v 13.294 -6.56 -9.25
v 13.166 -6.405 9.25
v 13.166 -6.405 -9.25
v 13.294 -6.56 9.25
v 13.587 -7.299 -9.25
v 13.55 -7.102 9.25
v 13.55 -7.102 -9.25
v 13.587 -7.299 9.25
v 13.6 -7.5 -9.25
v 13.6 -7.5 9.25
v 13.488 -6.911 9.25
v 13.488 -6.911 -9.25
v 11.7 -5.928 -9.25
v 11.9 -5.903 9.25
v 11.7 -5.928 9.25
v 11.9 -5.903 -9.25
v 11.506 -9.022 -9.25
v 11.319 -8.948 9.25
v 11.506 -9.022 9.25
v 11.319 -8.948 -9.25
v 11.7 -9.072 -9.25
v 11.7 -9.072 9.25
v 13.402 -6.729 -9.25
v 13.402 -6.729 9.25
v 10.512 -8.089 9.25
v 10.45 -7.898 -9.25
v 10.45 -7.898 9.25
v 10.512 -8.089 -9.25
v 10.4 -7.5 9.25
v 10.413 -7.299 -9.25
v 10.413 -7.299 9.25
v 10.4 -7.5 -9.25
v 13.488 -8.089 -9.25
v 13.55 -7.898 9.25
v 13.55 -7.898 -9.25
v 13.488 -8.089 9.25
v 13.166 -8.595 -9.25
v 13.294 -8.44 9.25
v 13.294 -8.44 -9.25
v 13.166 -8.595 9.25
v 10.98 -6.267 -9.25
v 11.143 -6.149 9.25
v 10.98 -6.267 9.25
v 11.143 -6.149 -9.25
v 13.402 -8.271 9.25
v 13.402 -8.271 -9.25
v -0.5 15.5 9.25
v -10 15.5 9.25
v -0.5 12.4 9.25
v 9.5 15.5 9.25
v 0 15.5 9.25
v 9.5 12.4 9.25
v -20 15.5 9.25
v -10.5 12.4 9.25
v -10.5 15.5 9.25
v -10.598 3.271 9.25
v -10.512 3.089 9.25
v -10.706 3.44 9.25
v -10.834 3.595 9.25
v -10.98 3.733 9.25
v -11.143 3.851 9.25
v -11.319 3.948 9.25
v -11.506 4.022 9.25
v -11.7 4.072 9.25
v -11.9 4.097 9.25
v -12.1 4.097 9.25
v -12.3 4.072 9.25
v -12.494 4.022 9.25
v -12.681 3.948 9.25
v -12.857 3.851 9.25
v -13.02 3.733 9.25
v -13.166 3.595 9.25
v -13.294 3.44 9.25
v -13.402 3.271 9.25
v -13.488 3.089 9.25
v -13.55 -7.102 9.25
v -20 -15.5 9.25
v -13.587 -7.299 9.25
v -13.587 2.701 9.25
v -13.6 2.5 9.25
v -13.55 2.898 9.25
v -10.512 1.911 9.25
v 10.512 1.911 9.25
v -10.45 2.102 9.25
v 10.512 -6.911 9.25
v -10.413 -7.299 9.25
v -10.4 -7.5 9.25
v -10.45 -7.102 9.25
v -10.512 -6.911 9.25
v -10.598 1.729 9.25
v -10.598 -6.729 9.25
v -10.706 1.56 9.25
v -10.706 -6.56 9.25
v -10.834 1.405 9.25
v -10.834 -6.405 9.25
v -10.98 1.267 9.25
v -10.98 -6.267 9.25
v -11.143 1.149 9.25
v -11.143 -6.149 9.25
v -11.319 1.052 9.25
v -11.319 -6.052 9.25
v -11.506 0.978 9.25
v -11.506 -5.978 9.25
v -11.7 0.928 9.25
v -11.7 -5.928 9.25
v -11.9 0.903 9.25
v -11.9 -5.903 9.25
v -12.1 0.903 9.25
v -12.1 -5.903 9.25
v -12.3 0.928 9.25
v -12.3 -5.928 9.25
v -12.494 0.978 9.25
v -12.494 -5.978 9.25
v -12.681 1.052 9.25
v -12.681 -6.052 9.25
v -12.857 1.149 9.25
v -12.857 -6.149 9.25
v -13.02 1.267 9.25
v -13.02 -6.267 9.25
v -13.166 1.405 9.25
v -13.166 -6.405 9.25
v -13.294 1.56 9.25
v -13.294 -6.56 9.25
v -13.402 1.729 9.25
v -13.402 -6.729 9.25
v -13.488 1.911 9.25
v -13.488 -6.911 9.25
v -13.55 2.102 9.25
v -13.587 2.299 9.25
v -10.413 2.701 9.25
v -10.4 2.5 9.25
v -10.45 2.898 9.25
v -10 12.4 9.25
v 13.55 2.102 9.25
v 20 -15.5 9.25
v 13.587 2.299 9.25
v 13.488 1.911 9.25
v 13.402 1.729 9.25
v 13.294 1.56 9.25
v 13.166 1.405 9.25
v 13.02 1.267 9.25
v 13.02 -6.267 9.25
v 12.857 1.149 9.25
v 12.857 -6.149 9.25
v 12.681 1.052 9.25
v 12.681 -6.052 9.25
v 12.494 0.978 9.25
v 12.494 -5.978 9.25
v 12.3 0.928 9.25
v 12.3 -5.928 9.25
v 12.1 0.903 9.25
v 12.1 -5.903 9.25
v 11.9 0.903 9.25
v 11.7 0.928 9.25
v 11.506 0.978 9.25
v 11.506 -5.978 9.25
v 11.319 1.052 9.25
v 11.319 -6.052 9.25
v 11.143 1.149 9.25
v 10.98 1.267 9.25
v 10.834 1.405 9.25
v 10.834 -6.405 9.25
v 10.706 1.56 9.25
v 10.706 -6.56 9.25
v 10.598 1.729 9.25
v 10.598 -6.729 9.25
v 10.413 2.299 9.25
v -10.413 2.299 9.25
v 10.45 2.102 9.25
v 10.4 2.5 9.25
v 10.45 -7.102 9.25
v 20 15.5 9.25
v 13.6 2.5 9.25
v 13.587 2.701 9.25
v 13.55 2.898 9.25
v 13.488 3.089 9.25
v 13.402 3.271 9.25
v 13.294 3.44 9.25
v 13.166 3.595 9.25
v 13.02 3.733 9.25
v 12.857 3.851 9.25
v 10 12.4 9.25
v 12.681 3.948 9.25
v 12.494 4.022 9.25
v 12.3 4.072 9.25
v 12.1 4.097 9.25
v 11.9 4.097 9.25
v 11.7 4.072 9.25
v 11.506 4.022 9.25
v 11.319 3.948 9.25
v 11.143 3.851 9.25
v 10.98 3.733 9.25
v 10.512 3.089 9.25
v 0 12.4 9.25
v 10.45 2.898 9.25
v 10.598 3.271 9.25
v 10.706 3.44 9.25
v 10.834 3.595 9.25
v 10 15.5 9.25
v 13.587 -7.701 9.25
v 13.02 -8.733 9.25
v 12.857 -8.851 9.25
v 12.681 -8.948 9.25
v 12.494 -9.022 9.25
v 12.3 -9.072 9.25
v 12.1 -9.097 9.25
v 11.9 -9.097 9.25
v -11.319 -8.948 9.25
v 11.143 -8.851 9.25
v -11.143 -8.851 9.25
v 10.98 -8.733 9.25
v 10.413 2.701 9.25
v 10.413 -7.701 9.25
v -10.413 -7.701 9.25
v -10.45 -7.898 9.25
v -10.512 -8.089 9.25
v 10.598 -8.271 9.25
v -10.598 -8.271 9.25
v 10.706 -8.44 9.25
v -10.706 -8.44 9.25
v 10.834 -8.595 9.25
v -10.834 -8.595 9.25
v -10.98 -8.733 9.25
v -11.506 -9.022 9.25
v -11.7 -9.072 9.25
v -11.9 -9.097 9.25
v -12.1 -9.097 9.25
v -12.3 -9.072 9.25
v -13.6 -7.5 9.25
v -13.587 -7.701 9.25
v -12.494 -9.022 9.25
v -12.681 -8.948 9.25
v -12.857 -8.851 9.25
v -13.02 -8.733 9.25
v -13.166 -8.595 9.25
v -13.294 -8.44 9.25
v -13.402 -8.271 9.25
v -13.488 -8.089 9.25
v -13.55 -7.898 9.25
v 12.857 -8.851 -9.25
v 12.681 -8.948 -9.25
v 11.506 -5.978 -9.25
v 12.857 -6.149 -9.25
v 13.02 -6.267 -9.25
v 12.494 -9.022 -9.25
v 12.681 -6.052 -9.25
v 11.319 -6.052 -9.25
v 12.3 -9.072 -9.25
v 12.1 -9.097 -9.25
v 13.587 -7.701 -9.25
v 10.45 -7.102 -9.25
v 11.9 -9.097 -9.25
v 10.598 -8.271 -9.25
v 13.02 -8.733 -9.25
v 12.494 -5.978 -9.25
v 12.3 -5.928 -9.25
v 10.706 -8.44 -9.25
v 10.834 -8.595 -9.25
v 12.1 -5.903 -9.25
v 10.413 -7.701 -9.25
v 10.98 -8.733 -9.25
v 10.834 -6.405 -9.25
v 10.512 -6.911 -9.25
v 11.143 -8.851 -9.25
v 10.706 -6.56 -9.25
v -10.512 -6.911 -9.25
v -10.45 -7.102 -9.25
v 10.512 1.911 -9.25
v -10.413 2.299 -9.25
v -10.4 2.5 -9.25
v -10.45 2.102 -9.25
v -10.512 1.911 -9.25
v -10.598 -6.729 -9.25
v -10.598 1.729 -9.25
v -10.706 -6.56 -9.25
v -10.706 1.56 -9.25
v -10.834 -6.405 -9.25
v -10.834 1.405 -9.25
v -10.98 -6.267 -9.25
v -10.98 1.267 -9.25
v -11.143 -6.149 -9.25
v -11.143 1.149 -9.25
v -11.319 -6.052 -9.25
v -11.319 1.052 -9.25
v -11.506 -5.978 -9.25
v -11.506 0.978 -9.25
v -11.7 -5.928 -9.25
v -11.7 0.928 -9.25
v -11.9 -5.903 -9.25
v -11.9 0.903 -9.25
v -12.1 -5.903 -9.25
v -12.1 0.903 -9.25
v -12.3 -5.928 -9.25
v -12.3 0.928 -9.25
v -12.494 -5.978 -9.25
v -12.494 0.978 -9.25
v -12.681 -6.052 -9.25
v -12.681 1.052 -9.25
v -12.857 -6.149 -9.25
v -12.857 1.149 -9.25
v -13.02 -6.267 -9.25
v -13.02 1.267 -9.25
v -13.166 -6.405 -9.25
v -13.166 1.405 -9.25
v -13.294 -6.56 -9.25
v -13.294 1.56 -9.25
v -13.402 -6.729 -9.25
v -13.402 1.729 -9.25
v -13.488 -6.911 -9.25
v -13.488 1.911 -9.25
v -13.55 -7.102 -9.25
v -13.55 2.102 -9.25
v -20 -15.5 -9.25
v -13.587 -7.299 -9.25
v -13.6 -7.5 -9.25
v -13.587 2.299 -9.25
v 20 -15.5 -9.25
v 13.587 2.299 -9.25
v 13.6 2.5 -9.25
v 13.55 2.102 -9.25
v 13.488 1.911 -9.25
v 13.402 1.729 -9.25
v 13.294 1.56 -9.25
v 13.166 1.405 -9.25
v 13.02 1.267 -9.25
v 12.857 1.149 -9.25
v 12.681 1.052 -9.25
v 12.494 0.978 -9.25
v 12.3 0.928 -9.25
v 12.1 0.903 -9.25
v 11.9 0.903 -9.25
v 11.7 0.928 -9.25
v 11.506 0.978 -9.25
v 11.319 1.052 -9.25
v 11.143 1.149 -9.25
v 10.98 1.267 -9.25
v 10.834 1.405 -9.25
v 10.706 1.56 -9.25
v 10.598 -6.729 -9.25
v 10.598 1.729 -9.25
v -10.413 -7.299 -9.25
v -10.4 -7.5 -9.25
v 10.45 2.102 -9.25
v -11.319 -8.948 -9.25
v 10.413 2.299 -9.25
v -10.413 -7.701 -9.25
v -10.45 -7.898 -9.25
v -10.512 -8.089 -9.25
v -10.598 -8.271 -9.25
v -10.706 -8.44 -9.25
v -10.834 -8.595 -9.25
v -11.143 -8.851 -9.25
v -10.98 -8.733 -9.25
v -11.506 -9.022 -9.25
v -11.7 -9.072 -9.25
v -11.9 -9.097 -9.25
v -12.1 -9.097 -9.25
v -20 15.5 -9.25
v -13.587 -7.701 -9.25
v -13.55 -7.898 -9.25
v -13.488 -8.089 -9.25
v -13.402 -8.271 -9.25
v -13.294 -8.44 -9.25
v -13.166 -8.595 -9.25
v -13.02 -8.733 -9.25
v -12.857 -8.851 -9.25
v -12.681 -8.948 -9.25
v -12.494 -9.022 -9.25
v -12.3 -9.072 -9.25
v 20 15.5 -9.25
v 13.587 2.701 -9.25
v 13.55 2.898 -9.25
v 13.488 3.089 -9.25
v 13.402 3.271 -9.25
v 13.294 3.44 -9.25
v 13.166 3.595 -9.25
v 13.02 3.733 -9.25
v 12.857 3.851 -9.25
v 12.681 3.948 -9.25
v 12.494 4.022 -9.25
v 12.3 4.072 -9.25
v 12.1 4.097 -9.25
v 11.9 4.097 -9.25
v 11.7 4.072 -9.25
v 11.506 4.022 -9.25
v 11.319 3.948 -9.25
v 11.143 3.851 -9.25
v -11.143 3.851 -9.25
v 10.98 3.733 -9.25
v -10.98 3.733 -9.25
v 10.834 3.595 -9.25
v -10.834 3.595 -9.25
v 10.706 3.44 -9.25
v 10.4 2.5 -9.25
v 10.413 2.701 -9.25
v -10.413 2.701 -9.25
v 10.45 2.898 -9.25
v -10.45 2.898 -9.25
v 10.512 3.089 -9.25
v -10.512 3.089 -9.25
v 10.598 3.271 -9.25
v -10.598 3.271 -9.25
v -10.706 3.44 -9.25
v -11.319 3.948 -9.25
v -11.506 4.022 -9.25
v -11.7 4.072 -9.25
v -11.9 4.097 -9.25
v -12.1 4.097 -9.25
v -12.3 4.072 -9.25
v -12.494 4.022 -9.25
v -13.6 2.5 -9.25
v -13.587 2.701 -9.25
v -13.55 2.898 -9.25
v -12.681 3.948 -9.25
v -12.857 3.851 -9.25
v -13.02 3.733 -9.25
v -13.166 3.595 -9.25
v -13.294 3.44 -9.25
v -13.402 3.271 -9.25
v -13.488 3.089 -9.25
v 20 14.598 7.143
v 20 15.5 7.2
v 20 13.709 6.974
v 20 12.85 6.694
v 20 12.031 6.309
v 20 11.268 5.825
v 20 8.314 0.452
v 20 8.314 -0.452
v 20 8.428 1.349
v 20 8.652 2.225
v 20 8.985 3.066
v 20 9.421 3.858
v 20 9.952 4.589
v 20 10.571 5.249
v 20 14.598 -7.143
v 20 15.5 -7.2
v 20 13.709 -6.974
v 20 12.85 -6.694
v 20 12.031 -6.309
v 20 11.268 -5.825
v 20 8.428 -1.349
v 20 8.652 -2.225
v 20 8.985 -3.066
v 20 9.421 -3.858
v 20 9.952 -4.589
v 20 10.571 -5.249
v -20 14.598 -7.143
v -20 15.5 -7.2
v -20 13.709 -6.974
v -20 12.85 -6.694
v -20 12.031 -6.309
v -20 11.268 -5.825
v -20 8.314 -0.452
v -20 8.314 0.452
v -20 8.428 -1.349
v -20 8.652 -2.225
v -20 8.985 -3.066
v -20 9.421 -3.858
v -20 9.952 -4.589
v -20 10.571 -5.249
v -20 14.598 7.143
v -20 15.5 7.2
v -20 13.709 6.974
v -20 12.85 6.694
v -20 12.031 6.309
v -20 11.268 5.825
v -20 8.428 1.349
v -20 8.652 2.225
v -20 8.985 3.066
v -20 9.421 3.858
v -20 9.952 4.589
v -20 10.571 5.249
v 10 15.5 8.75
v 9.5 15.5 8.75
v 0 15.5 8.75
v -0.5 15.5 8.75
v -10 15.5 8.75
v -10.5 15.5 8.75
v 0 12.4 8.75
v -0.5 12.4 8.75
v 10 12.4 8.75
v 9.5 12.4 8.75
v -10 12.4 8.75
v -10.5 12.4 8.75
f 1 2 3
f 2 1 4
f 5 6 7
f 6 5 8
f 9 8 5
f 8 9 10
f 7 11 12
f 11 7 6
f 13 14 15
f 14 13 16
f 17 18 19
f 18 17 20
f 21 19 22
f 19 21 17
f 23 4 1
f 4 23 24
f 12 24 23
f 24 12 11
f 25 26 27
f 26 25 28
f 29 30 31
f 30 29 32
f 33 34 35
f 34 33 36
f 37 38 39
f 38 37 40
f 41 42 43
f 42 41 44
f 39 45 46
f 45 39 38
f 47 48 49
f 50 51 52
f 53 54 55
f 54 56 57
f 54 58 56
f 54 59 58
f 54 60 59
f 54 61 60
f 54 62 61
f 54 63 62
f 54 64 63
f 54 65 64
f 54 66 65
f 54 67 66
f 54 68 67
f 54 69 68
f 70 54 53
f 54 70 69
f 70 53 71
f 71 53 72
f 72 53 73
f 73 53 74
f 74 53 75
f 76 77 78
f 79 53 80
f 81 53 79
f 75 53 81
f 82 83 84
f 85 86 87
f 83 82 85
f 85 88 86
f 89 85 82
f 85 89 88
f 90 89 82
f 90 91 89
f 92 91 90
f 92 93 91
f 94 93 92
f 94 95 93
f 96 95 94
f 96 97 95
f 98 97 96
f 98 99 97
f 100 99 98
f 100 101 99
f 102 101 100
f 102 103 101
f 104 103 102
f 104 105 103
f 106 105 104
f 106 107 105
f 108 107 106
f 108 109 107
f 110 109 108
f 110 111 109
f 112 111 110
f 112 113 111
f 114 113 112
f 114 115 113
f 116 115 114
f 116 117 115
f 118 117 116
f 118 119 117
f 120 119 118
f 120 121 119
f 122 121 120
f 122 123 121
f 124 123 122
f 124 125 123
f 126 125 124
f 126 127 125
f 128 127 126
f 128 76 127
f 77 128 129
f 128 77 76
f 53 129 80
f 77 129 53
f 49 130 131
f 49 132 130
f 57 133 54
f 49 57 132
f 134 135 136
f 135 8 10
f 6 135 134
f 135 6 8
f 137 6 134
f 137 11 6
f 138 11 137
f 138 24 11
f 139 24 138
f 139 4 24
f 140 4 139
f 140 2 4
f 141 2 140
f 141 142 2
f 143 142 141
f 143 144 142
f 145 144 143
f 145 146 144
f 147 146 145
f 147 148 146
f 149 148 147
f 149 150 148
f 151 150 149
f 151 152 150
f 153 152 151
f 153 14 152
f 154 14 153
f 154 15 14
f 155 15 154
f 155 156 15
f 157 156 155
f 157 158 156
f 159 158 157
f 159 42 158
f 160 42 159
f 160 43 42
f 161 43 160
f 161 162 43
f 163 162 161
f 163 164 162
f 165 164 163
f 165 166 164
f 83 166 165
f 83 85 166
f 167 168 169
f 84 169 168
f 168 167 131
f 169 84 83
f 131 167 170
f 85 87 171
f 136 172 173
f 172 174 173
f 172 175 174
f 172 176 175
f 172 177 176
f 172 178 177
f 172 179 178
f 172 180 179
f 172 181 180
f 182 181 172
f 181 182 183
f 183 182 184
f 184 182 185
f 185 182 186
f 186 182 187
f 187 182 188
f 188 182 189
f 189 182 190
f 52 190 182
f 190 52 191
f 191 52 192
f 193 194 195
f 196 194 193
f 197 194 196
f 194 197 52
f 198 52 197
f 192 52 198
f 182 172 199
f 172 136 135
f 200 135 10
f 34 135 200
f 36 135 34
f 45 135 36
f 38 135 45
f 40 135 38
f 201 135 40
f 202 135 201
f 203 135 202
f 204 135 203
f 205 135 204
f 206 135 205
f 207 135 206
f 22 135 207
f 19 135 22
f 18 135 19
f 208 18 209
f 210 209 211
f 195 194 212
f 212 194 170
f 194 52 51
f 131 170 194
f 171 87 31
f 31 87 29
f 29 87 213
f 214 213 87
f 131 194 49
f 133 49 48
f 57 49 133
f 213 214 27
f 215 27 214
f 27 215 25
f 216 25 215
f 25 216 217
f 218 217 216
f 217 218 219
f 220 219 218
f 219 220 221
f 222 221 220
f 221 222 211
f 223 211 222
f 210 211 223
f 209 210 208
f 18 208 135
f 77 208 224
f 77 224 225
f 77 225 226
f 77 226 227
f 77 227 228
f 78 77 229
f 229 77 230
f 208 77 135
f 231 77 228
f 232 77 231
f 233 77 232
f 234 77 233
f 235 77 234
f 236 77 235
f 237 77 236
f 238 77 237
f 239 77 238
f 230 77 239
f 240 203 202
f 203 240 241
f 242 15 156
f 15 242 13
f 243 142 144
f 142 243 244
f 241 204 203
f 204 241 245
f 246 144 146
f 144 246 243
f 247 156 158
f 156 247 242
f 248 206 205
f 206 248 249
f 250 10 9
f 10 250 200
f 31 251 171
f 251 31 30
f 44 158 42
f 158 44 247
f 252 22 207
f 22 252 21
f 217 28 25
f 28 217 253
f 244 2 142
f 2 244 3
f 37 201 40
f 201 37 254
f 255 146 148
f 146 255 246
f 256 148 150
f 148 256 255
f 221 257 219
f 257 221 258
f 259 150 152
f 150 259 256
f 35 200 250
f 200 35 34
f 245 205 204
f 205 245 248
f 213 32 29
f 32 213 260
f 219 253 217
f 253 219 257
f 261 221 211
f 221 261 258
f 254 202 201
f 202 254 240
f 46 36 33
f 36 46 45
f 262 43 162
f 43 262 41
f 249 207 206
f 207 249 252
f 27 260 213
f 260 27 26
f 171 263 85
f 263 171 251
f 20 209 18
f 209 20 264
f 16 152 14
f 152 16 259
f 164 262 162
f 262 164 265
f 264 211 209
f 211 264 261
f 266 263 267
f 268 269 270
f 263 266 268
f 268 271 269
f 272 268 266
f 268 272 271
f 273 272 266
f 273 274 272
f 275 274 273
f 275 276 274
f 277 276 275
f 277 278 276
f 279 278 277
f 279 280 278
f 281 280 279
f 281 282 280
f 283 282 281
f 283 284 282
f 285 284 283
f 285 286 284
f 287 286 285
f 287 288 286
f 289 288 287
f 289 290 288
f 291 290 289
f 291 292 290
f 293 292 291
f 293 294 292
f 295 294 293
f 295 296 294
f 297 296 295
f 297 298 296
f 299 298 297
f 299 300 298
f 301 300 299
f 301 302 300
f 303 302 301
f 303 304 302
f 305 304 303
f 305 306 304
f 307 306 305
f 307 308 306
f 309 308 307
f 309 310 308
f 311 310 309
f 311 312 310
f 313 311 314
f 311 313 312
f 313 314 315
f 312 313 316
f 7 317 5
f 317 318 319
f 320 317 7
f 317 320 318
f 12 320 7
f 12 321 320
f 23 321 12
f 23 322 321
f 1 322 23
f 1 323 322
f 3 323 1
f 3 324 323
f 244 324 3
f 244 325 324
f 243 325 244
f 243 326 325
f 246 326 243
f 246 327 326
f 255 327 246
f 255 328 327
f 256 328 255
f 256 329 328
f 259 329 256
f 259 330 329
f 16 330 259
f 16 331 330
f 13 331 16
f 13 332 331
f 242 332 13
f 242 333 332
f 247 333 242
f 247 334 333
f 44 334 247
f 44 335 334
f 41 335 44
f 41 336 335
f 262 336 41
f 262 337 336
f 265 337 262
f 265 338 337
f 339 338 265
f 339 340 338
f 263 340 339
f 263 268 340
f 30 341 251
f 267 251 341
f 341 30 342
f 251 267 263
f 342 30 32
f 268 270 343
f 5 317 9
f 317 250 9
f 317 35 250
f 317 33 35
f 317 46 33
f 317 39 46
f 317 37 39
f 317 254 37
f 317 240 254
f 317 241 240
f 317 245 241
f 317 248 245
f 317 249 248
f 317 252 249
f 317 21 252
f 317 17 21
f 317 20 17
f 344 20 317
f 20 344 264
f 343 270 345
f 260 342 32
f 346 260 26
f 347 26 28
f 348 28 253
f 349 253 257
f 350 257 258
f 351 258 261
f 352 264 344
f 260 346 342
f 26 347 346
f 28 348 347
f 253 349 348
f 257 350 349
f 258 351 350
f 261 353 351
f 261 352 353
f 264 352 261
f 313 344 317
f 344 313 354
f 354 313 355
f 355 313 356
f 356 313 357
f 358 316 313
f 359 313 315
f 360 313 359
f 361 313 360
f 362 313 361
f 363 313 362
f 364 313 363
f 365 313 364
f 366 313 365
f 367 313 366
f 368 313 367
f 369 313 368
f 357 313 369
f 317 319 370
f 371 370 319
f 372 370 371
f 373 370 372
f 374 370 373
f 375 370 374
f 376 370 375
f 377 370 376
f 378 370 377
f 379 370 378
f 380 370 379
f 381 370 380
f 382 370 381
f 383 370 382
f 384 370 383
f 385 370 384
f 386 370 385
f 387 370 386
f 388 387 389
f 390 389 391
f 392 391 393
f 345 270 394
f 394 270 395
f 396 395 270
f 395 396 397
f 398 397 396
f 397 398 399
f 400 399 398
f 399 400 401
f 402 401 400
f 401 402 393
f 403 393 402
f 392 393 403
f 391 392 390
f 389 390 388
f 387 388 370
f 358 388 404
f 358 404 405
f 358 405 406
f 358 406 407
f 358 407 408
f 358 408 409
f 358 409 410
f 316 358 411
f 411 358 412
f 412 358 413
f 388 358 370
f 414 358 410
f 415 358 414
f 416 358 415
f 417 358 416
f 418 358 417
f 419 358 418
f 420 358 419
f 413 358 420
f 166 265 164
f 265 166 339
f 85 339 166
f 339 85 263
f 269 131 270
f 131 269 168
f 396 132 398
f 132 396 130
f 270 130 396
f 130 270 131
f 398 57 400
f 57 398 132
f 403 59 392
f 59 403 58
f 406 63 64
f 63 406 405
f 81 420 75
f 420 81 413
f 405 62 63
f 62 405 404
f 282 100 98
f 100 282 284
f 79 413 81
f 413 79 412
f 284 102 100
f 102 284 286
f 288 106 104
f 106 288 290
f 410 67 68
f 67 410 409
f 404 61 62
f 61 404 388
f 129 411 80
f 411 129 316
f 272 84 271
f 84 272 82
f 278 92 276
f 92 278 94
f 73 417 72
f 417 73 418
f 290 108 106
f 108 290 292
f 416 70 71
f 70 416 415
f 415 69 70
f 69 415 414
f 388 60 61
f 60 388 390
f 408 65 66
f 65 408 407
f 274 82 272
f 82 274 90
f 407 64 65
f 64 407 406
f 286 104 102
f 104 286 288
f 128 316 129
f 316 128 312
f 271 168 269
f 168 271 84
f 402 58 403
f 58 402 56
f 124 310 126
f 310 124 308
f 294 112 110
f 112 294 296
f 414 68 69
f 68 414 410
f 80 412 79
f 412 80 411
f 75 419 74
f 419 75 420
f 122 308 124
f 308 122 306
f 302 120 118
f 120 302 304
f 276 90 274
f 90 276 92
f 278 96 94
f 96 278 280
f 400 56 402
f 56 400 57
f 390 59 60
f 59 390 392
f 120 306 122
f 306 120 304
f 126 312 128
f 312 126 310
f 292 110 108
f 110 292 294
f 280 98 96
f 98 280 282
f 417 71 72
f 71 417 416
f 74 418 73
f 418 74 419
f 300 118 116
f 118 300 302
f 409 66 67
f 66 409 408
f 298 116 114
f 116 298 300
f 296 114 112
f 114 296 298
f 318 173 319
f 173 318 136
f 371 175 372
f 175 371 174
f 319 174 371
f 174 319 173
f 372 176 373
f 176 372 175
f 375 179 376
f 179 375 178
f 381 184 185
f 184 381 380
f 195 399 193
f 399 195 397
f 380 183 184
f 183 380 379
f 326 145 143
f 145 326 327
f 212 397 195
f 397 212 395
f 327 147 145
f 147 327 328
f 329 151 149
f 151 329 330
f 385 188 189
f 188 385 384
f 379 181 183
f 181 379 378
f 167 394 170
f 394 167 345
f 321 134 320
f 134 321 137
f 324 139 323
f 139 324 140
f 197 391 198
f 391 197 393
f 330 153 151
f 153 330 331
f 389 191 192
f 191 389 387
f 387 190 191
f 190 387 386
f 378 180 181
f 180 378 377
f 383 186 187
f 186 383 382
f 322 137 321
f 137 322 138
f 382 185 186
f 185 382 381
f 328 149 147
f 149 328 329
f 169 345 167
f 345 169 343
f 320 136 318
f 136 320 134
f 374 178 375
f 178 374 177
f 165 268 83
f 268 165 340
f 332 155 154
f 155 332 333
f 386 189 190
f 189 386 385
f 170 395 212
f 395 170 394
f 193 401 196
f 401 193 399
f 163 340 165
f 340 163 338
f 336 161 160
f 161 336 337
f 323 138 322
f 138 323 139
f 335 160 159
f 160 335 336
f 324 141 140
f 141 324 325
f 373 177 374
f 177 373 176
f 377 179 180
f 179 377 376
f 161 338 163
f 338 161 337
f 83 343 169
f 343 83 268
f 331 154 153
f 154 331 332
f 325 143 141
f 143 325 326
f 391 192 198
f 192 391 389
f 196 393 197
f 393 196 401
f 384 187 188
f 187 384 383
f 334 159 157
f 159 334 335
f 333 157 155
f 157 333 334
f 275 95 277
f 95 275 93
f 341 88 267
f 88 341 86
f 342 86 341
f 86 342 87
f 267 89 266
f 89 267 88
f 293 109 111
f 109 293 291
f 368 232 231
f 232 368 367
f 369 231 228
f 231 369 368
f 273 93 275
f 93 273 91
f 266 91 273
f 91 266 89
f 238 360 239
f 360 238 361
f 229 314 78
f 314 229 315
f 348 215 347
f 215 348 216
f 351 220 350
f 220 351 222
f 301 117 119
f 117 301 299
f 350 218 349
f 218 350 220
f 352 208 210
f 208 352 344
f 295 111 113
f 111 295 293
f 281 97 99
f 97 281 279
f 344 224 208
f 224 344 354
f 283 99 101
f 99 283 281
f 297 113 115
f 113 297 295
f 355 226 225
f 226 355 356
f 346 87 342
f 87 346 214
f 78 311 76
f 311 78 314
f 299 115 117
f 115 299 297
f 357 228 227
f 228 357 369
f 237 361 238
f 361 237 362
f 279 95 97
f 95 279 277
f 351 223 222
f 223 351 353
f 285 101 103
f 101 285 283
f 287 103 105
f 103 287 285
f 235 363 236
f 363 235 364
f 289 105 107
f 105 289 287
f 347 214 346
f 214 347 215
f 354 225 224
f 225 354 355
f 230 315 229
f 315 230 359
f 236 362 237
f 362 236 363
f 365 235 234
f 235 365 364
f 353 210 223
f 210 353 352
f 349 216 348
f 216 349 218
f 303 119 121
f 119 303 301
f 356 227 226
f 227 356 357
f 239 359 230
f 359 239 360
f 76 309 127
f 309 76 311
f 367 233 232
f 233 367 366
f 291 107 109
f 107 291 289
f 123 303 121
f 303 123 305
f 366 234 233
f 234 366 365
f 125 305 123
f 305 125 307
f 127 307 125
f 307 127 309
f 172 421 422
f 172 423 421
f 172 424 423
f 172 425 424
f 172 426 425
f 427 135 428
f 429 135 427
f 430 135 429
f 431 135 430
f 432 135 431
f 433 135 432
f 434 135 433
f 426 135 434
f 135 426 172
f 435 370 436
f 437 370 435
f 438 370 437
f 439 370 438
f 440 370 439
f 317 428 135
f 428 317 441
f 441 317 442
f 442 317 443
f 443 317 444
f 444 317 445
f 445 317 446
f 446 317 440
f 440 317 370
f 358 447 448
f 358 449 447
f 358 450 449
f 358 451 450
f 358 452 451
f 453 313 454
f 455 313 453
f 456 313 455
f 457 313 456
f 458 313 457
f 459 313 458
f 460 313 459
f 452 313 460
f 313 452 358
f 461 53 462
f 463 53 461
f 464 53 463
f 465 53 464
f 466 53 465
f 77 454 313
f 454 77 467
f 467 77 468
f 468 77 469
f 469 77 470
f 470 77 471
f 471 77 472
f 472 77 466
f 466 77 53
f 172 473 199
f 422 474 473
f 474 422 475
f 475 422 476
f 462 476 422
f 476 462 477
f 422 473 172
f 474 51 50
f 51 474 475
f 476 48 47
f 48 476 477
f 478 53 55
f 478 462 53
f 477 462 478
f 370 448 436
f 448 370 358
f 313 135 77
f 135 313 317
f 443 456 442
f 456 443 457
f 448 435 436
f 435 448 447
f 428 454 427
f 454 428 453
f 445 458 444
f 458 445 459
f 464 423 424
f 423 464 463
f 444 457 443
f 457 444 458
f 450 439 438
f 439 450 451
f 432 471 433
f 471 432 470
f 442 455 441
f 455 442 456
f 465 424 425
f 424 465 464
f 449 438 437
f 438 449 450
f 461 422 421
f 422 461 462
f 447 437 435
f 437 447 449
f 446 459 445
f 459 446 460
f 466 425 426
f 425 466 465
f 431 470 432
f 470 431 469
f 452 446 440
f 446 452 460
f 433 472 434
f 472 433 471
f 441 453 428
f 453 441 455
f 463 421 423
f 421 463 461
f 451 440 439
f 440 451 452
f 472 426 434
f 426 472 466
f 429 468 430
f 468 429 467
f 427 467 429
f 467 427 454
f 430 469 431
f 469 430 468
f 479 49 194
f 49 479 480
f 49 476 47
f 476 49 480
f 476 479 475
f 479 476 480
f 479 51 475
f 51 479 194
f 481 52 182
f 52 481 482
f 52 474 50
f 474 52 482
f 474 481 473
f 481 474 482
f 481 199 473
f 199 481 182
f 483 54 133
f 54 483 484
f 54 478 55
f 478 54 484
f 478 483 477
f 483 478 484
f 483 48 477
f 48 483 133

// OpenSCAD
// file: letter.scad
// letter
// - emboss
module letter(strg, letter_height, letter_size, font) {
	// Use linear_extrude() to make the letters 3D objects as they
	// are only 2D shapes when only using text()
	linear_extrude(height = letter_height) {
		text(strg, size = letter_size, font = font, halign = "center", valign = "center", $fn = 16);
	}
}

font = "Liberation Sans";


// letter("jay", 5, 20, "Liberation Sans");
// file: dovetail.scad
// create a dovetail
// male = set tolerance = 0
// female = set tolerance = 0.2

module dovetail (base_dim, base_z, tolerance) {

    $fn = 50;


    linear_extrude(height = base_z, center = true, convexity = 10)
    polygon([[-(base_dim + tolerance),0],[(base_dim + tolerance),0],
        [(base_dim * 2 + tolerance),(base_dim + tolerance)],
        [-(base_dim * 2 + tolerance),(base_dim + tolerance)]],
        [[3,2,1,0]]);
    
}

// dovetail (5, 18, 0);
// main file
// straight


include <dovetail.scad>;
include <letter.scad>;

engrave_text = "14 x 40mm";
tubing_od = 14;
tool_z = 18.5;
tube_tolerance = 0.2;

inside_bend_radius = 48/2;
center_bend_radius = 48/2 + tubing_od/2;

// str = straight section
str_x = 40;

// designed for drywall screws #6 x 1 1/4
m4_screw_dia = 4;
m4_screw_pilot = 3.2;
m4_screw_head_dia = 7 ;
m4_screw_head_countersink =  3;   // distance to bottom

$fn = 50;

// TODO


difference () {
    {
    union () {
        cube([str_x, center_bend_radius, tool_z],center = true);
        
        // female dovetail
        // translate([-str_x/2, -center_bend_radius/2 + 10,0])
        // rotate([0,0,90])
        // dovetail(3,tool_z, 0.2);
        }
    }
    // substract
    {
    // tube grove
    translate([0,center_bend_radius/2,0])
    rotate([0,90,0])
    cylinder(r = tubing_od/2 + tube_tolerance, h = str_x, center = true);
        
    // female dovetail
    // translate([str_x/2, -center_bend_radius/2 + 10,0])
    // rotate([0,0,90])
    // dovetail(3,tool_z, 0.2);
        
    // mounting holes
    y_base = -center_bend_radius/2;
    hole_set = [[(str_x/2 - 8), y_base + 8], [-(str_x/2 - 8),y_base + 18],
        [(str_x/2 - 8), y_base + 18], [-(str_x/2 - 8),y_base + 8]];
    for ( i = hole_set ) {
        union () {
        translate([i[0],i[1],0])
        cylinder(r = m4_screw_pilot/2, h = tool_z, center = true);
        
        // translate([i[0],i[1],(tool_z/2 - mnt_screw_head_countersink/2)])
        // cylinder(r = mnt_screw_head_dia/2, 
        //     h = mnt_screw_head_countersink, 
        //     center = true);
        }
    }
    
    // angle lines
    // 0
    translate([0, center_bend_radius/2 - center_bend_radius/10,tool_z/2 - 0.5])
    rotate([0,0, 90])
    cube([center_bend_radius/4, 0.5, 0.5], center=false);
    
    translate([10, center_bend_radius/2 - center_bend_radius/10,tool_z/2 - 0.5])
    rotate([0,0, 90])
    cube([center_bend_radius/10, 0.5, 0.5], center=false);
    
    translate([-10, center_bend_radius/2 - center_bend_radius/10,tool_z/2 - 0.5])
    rotate([0,0, 90])
    cube([center_bend_radius/4, 0.5, 0.5], center=false);
    
    // engraved top
    // translate([0,10,tool_z/2 -1])
    // letter(engrave_text, 1, 4, "Liberation Sans");
    }
}
